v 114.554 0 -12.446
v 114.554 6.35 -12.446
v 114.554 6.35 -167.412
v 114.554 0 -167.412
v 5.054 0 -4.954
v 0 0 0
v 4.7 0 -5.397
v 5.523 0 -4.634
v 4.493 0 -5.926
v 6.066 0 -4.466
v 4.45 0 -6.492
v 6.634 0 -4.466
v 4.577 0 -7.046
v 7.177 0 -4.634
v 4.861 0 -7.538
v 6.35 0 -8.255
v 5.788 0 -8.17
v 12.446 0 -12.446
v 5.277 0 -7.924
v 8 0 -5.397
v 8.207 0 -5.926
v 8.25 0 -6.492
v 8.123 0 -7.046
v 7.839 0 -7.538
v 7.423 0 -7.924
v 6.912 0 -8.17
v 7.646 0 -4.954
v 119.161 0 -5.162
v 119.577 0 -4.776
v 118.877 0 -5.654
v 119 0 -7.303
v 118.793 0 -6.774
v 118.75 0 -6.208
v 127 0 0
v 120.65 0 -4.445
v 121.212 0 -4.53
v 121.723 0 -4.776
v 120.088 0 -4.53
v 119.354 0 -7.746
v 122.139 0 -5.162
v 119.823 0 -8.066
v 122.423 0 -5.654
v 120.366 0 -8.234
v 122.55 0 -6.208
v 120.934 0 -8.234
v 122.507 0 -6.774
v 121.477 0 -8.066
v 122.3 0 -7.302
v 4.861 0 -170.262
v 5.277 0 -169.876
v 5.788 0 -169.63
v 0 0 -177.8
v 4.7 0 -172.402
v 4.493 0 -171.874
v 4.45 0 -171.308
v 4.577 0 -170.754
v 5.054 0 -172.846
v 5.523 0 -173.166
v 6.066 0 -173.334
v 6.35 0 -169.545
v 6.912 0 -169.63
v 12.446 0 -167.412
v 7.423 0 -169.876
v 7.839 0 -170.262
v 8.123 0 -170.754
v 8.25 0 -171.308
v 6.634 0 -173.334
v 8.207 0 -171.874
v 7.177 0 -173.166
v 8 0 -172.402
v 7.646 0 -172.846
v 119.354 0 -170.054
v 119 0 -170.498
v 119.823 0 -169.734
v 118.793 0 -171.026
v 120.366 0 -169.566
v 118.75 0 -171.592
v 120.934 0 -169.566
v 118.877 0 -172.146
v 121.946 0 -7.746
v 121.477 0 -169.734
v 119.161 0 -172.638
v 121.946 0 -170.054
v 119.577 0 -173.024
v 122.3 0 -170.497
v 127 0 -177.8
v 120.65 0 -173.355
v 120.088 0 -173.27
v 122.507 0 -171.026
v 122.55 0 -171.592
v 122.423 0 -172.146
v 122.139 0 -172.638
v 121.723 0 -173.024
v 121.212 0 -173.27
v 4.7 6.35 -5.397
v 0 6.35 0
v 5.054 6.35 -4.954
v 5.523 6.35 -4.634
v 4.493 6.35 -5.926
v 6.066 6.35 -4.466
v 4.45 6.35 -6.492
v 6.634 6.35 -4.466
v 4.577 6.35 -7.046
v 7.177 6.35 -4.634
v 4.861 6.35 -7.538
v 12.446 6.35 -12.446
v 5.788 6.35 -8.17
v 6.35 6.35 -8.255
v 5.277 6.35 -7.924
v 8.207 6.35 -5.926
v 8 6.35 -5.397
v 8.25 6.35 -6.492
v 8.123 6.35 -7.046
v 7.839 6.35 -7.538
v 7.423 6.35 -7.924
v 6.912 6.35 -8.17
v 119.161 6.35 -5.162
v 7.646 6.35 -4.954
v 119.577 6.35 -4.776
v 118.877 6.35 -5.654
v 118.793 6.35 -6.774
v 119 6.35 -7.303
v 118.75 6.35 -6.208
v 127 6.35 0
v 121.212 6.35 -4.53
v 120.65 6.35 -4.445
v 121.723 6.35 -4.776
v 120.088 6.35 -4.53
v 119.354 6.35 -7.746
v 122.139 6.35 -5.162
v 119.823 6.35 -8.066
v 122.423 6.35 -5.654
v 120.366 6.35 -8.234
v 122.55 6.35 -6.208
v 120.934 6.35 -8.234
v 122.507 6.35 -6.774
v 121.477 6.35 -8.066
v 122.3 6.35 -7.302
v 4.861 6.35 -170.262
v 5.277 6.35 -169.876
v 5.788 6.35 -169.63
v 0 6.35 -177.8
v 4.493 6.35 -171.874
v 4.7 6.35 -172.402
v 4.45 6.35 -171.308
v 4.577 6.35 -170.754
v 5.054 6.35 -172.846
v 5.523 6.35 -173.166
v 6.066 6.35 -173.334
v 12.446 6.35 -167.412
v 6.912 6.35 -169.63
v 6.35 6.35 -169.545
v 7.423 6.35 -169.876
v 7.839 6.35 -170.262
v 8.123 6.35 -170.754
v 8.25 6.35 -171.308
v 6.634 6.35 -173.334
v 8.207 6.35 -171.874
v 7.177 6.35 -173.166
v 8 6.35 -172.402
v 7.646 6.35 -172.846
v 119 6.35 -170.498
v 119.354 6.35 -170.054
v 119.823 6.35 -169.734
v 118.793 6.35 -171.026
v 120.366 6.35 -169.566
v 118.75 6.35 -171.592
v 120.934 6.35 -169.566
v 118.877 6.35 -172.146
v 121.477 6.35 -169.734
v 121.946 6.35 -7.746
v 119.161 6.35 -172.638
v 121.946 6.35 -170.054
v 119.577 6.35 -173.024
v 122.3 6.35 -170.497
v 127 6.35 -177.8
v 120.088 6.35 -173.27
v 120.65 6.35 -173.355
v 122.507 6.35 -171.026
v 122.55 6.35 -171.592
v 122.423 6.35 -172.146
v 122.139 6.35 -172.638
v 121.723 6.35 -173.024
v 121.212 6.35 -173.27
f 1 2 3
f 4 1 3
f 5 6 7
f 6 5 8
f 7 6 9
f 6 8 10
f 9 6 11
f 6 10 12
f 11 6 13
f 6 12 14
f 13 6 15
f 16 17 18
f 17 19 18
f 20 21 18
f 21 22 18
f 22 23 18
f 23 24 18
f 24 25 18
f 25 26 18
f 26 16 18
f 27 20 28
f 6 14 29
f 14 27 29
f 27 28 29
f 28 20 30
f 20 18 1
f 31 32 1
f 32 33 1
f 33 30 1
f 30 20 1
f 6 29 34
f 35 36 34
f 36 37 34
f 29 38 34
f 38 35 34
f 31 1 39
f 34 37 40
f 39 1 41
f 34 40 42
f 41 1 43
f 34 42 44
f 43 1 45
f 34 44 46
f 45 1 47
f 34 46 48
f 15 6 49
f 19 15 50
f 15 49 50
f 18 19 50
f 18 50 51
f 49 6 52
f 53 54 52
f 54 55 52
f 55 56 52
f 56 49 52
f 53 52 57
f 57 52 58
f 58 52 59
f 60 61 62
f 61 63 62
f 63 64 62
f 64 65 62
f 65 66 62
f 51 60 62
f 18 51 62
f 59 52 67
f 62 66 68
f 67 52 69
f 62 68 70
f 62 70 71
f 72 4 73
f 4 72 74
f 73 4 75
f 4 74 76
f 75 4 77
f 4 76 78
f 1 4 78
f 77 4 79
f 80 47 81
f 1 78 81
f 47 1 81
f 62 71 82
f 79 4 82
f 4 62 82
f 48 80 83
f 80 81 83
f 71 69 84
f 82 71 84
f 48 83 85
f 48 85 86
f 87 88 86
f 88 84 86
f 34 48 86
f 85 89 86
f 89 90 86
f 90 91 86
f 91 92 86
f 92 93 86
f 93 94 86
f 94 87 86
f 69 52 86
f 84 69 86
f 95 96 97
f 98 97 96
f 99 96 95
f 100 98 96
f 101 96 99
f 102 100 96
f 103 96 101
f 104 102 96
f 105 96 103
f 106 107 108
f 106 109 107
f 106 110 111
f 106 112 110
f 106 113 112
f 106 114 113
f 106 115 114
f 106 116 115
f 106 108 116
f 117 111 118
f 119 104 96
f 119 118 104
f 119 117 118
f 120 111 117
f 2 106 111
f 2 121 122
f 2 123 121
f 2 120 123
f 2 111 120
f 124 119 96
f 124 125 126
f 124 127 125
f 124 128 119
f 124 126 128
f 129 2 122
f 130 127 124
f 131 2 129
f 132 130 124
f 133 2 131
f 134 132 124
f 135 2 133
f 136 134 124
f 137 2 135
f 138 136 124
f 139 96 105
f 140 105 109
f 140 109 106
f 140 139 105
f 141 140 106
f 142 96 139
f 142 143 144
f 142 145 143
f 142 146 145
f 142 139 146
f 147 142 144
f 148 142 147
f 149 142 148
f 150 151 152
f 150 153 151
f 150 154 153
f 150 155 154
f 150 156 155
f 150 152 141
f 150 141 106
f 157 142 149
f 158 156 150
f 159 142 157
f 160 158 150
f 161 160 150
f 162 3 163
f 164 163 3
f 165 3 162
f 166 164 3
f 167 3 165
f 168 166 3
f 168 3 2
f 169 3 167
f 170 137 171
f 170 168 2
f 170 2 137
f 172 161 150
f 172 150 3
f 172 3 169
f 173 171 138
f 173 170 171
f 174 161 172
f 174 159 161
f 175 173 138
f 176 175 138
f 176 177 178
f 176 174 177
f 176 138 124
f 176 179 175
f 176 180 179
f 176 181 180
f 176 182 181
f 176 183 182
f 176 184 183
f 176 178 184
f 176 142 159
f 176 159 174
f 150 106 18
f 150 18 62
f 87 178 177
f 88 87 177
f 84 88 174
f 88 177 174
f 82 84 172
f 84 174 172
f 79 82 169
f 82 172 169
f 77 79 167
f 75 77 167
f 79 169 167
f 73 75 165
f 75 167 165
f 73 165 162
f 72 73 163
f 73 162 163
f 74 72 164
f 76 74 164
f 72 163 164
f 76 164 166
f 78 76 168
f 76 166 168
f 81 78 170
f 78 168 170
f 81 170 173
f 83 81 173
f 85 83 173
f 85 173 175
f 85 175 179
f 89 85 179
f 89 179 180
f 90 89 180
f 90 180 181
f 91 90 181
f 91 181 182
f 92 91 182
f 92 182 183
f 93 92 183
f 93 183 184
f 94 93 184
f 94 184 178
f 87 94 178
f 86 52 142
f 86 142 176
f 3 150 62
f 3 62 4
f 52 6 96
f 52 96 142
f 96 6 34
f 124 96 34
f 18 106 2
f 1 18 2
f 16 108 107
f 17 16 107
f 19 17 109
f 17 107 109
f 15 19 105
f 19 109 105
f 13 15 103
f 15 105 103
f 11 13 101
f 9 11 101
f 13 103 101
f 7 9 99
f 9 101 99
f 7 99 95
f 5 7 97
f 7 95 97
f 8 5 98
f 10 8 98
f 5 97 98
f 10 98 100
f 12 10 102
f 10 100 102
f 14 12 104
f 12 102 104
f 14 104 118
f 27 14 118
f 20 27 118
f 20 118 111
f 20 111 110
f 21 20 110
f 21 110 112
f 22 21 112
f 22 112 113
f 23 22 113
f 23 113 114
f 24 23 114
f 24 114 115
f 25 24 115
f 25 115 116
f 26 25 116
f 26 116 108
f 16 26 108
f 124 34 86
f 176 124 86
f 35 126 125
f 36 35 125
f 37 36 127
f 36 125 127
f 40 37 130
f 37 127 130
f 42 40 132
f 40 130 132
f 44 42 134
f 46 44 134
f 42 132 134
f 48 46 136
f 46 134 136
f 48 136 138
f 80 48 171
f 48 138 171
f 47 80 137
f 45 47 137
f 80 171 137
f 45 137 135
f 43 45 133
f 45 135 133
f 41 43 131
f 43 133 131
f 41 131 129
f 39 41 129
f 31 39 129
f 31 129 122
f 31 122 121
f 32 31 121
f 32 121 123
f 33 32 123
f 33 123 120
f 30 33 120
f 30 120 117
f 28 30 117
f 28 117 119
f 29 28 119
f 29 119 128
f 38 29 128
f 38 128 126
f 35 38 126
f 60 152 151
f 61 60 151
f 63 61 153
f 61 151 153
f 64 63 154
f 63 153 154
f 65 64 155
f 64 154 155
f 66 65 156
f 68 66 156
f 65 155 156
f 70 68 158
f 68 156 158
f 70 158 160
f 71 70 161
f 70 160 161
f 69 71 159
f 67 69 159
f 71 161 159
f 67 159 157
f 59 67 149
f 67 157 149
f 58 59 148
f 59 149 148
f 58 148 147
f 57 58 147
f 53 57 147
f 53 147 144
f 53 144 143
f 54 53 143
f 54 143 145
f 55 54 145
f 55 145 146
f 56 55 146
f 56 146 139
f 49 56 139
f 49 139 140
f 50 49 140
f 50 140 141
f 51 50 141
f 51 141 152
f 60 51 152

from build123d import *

# Parameters (mm, degrees)
SKETCH1_W           = 127
SKETCH1_H           = 177.8
BOSS_EXTRUDE1_DEPTH = 6.35
SKETCH2_W           = 102.108
SKETCH2_H           = 154.965684877
CUT_EXTRUDE1_DEPTH  = 219.591313871
SKETCH3_R           = 1.905
CUT_EXTRUDE2_DEPTH  = 219.591313871


with BuildPart() as part:
    # Sketch1 → Boss-Extrude1 (new body)
    with BuildSketch(Plane(origin=(0, 0, 0), x_dir=(1, 0, 0), z_dir=(0, 1, 0))):
        with Locations((63.5, 88.9)):
            Rectangle(SKETCH1_W, SKETCH1_H)
    extrude(amount=BOSS_EXTRUDE1_DEPTH)

    # Sketch2 → Cut-Extrude1 (cut, through all)
    with BuildSketch(Plane(origin=(0, 6.35, 0), x_dir=(1, 0, 0), z_dir=(0, 1, 0))):
        with Locations((63.5, 89.928842438)):
            Rectangle(SKETCH2_W, SKETCH2_H)
    extrude(amount=-CUT_EXTRUDE1_DEPTH, mode=Mode.SUBTRACT)

    # Sketch3 → Cut-Extrude2 (cut, through all)
    with BuildSketch(Plane(origin=(0, 6.35, 0), x_dir=(1, 0, 0), z_dir=(0, 1, 0))):
        with Locations(Location((6.35, 171.45, 0), (0, 0, 270))):
            Circle(SKETCH3_R)
        with Locations(Location((6.35, 6.35, 0), (0, 0, 90))):
            Circle(SKETCH3_R)
        with Locations(Location((120.65, 6.35, 0), (0, 0, 270))):
            Circle(SKETCH3_R)
        with Locations(Location((120.65, 171.45, 0), (0, 0, 90))):
            Circle(SKETCH3_R)
    extrude(amount=-CUT_EXTRUDE2_DEPTH, mode=Mode.SUBTRACT)


solid = part.part
